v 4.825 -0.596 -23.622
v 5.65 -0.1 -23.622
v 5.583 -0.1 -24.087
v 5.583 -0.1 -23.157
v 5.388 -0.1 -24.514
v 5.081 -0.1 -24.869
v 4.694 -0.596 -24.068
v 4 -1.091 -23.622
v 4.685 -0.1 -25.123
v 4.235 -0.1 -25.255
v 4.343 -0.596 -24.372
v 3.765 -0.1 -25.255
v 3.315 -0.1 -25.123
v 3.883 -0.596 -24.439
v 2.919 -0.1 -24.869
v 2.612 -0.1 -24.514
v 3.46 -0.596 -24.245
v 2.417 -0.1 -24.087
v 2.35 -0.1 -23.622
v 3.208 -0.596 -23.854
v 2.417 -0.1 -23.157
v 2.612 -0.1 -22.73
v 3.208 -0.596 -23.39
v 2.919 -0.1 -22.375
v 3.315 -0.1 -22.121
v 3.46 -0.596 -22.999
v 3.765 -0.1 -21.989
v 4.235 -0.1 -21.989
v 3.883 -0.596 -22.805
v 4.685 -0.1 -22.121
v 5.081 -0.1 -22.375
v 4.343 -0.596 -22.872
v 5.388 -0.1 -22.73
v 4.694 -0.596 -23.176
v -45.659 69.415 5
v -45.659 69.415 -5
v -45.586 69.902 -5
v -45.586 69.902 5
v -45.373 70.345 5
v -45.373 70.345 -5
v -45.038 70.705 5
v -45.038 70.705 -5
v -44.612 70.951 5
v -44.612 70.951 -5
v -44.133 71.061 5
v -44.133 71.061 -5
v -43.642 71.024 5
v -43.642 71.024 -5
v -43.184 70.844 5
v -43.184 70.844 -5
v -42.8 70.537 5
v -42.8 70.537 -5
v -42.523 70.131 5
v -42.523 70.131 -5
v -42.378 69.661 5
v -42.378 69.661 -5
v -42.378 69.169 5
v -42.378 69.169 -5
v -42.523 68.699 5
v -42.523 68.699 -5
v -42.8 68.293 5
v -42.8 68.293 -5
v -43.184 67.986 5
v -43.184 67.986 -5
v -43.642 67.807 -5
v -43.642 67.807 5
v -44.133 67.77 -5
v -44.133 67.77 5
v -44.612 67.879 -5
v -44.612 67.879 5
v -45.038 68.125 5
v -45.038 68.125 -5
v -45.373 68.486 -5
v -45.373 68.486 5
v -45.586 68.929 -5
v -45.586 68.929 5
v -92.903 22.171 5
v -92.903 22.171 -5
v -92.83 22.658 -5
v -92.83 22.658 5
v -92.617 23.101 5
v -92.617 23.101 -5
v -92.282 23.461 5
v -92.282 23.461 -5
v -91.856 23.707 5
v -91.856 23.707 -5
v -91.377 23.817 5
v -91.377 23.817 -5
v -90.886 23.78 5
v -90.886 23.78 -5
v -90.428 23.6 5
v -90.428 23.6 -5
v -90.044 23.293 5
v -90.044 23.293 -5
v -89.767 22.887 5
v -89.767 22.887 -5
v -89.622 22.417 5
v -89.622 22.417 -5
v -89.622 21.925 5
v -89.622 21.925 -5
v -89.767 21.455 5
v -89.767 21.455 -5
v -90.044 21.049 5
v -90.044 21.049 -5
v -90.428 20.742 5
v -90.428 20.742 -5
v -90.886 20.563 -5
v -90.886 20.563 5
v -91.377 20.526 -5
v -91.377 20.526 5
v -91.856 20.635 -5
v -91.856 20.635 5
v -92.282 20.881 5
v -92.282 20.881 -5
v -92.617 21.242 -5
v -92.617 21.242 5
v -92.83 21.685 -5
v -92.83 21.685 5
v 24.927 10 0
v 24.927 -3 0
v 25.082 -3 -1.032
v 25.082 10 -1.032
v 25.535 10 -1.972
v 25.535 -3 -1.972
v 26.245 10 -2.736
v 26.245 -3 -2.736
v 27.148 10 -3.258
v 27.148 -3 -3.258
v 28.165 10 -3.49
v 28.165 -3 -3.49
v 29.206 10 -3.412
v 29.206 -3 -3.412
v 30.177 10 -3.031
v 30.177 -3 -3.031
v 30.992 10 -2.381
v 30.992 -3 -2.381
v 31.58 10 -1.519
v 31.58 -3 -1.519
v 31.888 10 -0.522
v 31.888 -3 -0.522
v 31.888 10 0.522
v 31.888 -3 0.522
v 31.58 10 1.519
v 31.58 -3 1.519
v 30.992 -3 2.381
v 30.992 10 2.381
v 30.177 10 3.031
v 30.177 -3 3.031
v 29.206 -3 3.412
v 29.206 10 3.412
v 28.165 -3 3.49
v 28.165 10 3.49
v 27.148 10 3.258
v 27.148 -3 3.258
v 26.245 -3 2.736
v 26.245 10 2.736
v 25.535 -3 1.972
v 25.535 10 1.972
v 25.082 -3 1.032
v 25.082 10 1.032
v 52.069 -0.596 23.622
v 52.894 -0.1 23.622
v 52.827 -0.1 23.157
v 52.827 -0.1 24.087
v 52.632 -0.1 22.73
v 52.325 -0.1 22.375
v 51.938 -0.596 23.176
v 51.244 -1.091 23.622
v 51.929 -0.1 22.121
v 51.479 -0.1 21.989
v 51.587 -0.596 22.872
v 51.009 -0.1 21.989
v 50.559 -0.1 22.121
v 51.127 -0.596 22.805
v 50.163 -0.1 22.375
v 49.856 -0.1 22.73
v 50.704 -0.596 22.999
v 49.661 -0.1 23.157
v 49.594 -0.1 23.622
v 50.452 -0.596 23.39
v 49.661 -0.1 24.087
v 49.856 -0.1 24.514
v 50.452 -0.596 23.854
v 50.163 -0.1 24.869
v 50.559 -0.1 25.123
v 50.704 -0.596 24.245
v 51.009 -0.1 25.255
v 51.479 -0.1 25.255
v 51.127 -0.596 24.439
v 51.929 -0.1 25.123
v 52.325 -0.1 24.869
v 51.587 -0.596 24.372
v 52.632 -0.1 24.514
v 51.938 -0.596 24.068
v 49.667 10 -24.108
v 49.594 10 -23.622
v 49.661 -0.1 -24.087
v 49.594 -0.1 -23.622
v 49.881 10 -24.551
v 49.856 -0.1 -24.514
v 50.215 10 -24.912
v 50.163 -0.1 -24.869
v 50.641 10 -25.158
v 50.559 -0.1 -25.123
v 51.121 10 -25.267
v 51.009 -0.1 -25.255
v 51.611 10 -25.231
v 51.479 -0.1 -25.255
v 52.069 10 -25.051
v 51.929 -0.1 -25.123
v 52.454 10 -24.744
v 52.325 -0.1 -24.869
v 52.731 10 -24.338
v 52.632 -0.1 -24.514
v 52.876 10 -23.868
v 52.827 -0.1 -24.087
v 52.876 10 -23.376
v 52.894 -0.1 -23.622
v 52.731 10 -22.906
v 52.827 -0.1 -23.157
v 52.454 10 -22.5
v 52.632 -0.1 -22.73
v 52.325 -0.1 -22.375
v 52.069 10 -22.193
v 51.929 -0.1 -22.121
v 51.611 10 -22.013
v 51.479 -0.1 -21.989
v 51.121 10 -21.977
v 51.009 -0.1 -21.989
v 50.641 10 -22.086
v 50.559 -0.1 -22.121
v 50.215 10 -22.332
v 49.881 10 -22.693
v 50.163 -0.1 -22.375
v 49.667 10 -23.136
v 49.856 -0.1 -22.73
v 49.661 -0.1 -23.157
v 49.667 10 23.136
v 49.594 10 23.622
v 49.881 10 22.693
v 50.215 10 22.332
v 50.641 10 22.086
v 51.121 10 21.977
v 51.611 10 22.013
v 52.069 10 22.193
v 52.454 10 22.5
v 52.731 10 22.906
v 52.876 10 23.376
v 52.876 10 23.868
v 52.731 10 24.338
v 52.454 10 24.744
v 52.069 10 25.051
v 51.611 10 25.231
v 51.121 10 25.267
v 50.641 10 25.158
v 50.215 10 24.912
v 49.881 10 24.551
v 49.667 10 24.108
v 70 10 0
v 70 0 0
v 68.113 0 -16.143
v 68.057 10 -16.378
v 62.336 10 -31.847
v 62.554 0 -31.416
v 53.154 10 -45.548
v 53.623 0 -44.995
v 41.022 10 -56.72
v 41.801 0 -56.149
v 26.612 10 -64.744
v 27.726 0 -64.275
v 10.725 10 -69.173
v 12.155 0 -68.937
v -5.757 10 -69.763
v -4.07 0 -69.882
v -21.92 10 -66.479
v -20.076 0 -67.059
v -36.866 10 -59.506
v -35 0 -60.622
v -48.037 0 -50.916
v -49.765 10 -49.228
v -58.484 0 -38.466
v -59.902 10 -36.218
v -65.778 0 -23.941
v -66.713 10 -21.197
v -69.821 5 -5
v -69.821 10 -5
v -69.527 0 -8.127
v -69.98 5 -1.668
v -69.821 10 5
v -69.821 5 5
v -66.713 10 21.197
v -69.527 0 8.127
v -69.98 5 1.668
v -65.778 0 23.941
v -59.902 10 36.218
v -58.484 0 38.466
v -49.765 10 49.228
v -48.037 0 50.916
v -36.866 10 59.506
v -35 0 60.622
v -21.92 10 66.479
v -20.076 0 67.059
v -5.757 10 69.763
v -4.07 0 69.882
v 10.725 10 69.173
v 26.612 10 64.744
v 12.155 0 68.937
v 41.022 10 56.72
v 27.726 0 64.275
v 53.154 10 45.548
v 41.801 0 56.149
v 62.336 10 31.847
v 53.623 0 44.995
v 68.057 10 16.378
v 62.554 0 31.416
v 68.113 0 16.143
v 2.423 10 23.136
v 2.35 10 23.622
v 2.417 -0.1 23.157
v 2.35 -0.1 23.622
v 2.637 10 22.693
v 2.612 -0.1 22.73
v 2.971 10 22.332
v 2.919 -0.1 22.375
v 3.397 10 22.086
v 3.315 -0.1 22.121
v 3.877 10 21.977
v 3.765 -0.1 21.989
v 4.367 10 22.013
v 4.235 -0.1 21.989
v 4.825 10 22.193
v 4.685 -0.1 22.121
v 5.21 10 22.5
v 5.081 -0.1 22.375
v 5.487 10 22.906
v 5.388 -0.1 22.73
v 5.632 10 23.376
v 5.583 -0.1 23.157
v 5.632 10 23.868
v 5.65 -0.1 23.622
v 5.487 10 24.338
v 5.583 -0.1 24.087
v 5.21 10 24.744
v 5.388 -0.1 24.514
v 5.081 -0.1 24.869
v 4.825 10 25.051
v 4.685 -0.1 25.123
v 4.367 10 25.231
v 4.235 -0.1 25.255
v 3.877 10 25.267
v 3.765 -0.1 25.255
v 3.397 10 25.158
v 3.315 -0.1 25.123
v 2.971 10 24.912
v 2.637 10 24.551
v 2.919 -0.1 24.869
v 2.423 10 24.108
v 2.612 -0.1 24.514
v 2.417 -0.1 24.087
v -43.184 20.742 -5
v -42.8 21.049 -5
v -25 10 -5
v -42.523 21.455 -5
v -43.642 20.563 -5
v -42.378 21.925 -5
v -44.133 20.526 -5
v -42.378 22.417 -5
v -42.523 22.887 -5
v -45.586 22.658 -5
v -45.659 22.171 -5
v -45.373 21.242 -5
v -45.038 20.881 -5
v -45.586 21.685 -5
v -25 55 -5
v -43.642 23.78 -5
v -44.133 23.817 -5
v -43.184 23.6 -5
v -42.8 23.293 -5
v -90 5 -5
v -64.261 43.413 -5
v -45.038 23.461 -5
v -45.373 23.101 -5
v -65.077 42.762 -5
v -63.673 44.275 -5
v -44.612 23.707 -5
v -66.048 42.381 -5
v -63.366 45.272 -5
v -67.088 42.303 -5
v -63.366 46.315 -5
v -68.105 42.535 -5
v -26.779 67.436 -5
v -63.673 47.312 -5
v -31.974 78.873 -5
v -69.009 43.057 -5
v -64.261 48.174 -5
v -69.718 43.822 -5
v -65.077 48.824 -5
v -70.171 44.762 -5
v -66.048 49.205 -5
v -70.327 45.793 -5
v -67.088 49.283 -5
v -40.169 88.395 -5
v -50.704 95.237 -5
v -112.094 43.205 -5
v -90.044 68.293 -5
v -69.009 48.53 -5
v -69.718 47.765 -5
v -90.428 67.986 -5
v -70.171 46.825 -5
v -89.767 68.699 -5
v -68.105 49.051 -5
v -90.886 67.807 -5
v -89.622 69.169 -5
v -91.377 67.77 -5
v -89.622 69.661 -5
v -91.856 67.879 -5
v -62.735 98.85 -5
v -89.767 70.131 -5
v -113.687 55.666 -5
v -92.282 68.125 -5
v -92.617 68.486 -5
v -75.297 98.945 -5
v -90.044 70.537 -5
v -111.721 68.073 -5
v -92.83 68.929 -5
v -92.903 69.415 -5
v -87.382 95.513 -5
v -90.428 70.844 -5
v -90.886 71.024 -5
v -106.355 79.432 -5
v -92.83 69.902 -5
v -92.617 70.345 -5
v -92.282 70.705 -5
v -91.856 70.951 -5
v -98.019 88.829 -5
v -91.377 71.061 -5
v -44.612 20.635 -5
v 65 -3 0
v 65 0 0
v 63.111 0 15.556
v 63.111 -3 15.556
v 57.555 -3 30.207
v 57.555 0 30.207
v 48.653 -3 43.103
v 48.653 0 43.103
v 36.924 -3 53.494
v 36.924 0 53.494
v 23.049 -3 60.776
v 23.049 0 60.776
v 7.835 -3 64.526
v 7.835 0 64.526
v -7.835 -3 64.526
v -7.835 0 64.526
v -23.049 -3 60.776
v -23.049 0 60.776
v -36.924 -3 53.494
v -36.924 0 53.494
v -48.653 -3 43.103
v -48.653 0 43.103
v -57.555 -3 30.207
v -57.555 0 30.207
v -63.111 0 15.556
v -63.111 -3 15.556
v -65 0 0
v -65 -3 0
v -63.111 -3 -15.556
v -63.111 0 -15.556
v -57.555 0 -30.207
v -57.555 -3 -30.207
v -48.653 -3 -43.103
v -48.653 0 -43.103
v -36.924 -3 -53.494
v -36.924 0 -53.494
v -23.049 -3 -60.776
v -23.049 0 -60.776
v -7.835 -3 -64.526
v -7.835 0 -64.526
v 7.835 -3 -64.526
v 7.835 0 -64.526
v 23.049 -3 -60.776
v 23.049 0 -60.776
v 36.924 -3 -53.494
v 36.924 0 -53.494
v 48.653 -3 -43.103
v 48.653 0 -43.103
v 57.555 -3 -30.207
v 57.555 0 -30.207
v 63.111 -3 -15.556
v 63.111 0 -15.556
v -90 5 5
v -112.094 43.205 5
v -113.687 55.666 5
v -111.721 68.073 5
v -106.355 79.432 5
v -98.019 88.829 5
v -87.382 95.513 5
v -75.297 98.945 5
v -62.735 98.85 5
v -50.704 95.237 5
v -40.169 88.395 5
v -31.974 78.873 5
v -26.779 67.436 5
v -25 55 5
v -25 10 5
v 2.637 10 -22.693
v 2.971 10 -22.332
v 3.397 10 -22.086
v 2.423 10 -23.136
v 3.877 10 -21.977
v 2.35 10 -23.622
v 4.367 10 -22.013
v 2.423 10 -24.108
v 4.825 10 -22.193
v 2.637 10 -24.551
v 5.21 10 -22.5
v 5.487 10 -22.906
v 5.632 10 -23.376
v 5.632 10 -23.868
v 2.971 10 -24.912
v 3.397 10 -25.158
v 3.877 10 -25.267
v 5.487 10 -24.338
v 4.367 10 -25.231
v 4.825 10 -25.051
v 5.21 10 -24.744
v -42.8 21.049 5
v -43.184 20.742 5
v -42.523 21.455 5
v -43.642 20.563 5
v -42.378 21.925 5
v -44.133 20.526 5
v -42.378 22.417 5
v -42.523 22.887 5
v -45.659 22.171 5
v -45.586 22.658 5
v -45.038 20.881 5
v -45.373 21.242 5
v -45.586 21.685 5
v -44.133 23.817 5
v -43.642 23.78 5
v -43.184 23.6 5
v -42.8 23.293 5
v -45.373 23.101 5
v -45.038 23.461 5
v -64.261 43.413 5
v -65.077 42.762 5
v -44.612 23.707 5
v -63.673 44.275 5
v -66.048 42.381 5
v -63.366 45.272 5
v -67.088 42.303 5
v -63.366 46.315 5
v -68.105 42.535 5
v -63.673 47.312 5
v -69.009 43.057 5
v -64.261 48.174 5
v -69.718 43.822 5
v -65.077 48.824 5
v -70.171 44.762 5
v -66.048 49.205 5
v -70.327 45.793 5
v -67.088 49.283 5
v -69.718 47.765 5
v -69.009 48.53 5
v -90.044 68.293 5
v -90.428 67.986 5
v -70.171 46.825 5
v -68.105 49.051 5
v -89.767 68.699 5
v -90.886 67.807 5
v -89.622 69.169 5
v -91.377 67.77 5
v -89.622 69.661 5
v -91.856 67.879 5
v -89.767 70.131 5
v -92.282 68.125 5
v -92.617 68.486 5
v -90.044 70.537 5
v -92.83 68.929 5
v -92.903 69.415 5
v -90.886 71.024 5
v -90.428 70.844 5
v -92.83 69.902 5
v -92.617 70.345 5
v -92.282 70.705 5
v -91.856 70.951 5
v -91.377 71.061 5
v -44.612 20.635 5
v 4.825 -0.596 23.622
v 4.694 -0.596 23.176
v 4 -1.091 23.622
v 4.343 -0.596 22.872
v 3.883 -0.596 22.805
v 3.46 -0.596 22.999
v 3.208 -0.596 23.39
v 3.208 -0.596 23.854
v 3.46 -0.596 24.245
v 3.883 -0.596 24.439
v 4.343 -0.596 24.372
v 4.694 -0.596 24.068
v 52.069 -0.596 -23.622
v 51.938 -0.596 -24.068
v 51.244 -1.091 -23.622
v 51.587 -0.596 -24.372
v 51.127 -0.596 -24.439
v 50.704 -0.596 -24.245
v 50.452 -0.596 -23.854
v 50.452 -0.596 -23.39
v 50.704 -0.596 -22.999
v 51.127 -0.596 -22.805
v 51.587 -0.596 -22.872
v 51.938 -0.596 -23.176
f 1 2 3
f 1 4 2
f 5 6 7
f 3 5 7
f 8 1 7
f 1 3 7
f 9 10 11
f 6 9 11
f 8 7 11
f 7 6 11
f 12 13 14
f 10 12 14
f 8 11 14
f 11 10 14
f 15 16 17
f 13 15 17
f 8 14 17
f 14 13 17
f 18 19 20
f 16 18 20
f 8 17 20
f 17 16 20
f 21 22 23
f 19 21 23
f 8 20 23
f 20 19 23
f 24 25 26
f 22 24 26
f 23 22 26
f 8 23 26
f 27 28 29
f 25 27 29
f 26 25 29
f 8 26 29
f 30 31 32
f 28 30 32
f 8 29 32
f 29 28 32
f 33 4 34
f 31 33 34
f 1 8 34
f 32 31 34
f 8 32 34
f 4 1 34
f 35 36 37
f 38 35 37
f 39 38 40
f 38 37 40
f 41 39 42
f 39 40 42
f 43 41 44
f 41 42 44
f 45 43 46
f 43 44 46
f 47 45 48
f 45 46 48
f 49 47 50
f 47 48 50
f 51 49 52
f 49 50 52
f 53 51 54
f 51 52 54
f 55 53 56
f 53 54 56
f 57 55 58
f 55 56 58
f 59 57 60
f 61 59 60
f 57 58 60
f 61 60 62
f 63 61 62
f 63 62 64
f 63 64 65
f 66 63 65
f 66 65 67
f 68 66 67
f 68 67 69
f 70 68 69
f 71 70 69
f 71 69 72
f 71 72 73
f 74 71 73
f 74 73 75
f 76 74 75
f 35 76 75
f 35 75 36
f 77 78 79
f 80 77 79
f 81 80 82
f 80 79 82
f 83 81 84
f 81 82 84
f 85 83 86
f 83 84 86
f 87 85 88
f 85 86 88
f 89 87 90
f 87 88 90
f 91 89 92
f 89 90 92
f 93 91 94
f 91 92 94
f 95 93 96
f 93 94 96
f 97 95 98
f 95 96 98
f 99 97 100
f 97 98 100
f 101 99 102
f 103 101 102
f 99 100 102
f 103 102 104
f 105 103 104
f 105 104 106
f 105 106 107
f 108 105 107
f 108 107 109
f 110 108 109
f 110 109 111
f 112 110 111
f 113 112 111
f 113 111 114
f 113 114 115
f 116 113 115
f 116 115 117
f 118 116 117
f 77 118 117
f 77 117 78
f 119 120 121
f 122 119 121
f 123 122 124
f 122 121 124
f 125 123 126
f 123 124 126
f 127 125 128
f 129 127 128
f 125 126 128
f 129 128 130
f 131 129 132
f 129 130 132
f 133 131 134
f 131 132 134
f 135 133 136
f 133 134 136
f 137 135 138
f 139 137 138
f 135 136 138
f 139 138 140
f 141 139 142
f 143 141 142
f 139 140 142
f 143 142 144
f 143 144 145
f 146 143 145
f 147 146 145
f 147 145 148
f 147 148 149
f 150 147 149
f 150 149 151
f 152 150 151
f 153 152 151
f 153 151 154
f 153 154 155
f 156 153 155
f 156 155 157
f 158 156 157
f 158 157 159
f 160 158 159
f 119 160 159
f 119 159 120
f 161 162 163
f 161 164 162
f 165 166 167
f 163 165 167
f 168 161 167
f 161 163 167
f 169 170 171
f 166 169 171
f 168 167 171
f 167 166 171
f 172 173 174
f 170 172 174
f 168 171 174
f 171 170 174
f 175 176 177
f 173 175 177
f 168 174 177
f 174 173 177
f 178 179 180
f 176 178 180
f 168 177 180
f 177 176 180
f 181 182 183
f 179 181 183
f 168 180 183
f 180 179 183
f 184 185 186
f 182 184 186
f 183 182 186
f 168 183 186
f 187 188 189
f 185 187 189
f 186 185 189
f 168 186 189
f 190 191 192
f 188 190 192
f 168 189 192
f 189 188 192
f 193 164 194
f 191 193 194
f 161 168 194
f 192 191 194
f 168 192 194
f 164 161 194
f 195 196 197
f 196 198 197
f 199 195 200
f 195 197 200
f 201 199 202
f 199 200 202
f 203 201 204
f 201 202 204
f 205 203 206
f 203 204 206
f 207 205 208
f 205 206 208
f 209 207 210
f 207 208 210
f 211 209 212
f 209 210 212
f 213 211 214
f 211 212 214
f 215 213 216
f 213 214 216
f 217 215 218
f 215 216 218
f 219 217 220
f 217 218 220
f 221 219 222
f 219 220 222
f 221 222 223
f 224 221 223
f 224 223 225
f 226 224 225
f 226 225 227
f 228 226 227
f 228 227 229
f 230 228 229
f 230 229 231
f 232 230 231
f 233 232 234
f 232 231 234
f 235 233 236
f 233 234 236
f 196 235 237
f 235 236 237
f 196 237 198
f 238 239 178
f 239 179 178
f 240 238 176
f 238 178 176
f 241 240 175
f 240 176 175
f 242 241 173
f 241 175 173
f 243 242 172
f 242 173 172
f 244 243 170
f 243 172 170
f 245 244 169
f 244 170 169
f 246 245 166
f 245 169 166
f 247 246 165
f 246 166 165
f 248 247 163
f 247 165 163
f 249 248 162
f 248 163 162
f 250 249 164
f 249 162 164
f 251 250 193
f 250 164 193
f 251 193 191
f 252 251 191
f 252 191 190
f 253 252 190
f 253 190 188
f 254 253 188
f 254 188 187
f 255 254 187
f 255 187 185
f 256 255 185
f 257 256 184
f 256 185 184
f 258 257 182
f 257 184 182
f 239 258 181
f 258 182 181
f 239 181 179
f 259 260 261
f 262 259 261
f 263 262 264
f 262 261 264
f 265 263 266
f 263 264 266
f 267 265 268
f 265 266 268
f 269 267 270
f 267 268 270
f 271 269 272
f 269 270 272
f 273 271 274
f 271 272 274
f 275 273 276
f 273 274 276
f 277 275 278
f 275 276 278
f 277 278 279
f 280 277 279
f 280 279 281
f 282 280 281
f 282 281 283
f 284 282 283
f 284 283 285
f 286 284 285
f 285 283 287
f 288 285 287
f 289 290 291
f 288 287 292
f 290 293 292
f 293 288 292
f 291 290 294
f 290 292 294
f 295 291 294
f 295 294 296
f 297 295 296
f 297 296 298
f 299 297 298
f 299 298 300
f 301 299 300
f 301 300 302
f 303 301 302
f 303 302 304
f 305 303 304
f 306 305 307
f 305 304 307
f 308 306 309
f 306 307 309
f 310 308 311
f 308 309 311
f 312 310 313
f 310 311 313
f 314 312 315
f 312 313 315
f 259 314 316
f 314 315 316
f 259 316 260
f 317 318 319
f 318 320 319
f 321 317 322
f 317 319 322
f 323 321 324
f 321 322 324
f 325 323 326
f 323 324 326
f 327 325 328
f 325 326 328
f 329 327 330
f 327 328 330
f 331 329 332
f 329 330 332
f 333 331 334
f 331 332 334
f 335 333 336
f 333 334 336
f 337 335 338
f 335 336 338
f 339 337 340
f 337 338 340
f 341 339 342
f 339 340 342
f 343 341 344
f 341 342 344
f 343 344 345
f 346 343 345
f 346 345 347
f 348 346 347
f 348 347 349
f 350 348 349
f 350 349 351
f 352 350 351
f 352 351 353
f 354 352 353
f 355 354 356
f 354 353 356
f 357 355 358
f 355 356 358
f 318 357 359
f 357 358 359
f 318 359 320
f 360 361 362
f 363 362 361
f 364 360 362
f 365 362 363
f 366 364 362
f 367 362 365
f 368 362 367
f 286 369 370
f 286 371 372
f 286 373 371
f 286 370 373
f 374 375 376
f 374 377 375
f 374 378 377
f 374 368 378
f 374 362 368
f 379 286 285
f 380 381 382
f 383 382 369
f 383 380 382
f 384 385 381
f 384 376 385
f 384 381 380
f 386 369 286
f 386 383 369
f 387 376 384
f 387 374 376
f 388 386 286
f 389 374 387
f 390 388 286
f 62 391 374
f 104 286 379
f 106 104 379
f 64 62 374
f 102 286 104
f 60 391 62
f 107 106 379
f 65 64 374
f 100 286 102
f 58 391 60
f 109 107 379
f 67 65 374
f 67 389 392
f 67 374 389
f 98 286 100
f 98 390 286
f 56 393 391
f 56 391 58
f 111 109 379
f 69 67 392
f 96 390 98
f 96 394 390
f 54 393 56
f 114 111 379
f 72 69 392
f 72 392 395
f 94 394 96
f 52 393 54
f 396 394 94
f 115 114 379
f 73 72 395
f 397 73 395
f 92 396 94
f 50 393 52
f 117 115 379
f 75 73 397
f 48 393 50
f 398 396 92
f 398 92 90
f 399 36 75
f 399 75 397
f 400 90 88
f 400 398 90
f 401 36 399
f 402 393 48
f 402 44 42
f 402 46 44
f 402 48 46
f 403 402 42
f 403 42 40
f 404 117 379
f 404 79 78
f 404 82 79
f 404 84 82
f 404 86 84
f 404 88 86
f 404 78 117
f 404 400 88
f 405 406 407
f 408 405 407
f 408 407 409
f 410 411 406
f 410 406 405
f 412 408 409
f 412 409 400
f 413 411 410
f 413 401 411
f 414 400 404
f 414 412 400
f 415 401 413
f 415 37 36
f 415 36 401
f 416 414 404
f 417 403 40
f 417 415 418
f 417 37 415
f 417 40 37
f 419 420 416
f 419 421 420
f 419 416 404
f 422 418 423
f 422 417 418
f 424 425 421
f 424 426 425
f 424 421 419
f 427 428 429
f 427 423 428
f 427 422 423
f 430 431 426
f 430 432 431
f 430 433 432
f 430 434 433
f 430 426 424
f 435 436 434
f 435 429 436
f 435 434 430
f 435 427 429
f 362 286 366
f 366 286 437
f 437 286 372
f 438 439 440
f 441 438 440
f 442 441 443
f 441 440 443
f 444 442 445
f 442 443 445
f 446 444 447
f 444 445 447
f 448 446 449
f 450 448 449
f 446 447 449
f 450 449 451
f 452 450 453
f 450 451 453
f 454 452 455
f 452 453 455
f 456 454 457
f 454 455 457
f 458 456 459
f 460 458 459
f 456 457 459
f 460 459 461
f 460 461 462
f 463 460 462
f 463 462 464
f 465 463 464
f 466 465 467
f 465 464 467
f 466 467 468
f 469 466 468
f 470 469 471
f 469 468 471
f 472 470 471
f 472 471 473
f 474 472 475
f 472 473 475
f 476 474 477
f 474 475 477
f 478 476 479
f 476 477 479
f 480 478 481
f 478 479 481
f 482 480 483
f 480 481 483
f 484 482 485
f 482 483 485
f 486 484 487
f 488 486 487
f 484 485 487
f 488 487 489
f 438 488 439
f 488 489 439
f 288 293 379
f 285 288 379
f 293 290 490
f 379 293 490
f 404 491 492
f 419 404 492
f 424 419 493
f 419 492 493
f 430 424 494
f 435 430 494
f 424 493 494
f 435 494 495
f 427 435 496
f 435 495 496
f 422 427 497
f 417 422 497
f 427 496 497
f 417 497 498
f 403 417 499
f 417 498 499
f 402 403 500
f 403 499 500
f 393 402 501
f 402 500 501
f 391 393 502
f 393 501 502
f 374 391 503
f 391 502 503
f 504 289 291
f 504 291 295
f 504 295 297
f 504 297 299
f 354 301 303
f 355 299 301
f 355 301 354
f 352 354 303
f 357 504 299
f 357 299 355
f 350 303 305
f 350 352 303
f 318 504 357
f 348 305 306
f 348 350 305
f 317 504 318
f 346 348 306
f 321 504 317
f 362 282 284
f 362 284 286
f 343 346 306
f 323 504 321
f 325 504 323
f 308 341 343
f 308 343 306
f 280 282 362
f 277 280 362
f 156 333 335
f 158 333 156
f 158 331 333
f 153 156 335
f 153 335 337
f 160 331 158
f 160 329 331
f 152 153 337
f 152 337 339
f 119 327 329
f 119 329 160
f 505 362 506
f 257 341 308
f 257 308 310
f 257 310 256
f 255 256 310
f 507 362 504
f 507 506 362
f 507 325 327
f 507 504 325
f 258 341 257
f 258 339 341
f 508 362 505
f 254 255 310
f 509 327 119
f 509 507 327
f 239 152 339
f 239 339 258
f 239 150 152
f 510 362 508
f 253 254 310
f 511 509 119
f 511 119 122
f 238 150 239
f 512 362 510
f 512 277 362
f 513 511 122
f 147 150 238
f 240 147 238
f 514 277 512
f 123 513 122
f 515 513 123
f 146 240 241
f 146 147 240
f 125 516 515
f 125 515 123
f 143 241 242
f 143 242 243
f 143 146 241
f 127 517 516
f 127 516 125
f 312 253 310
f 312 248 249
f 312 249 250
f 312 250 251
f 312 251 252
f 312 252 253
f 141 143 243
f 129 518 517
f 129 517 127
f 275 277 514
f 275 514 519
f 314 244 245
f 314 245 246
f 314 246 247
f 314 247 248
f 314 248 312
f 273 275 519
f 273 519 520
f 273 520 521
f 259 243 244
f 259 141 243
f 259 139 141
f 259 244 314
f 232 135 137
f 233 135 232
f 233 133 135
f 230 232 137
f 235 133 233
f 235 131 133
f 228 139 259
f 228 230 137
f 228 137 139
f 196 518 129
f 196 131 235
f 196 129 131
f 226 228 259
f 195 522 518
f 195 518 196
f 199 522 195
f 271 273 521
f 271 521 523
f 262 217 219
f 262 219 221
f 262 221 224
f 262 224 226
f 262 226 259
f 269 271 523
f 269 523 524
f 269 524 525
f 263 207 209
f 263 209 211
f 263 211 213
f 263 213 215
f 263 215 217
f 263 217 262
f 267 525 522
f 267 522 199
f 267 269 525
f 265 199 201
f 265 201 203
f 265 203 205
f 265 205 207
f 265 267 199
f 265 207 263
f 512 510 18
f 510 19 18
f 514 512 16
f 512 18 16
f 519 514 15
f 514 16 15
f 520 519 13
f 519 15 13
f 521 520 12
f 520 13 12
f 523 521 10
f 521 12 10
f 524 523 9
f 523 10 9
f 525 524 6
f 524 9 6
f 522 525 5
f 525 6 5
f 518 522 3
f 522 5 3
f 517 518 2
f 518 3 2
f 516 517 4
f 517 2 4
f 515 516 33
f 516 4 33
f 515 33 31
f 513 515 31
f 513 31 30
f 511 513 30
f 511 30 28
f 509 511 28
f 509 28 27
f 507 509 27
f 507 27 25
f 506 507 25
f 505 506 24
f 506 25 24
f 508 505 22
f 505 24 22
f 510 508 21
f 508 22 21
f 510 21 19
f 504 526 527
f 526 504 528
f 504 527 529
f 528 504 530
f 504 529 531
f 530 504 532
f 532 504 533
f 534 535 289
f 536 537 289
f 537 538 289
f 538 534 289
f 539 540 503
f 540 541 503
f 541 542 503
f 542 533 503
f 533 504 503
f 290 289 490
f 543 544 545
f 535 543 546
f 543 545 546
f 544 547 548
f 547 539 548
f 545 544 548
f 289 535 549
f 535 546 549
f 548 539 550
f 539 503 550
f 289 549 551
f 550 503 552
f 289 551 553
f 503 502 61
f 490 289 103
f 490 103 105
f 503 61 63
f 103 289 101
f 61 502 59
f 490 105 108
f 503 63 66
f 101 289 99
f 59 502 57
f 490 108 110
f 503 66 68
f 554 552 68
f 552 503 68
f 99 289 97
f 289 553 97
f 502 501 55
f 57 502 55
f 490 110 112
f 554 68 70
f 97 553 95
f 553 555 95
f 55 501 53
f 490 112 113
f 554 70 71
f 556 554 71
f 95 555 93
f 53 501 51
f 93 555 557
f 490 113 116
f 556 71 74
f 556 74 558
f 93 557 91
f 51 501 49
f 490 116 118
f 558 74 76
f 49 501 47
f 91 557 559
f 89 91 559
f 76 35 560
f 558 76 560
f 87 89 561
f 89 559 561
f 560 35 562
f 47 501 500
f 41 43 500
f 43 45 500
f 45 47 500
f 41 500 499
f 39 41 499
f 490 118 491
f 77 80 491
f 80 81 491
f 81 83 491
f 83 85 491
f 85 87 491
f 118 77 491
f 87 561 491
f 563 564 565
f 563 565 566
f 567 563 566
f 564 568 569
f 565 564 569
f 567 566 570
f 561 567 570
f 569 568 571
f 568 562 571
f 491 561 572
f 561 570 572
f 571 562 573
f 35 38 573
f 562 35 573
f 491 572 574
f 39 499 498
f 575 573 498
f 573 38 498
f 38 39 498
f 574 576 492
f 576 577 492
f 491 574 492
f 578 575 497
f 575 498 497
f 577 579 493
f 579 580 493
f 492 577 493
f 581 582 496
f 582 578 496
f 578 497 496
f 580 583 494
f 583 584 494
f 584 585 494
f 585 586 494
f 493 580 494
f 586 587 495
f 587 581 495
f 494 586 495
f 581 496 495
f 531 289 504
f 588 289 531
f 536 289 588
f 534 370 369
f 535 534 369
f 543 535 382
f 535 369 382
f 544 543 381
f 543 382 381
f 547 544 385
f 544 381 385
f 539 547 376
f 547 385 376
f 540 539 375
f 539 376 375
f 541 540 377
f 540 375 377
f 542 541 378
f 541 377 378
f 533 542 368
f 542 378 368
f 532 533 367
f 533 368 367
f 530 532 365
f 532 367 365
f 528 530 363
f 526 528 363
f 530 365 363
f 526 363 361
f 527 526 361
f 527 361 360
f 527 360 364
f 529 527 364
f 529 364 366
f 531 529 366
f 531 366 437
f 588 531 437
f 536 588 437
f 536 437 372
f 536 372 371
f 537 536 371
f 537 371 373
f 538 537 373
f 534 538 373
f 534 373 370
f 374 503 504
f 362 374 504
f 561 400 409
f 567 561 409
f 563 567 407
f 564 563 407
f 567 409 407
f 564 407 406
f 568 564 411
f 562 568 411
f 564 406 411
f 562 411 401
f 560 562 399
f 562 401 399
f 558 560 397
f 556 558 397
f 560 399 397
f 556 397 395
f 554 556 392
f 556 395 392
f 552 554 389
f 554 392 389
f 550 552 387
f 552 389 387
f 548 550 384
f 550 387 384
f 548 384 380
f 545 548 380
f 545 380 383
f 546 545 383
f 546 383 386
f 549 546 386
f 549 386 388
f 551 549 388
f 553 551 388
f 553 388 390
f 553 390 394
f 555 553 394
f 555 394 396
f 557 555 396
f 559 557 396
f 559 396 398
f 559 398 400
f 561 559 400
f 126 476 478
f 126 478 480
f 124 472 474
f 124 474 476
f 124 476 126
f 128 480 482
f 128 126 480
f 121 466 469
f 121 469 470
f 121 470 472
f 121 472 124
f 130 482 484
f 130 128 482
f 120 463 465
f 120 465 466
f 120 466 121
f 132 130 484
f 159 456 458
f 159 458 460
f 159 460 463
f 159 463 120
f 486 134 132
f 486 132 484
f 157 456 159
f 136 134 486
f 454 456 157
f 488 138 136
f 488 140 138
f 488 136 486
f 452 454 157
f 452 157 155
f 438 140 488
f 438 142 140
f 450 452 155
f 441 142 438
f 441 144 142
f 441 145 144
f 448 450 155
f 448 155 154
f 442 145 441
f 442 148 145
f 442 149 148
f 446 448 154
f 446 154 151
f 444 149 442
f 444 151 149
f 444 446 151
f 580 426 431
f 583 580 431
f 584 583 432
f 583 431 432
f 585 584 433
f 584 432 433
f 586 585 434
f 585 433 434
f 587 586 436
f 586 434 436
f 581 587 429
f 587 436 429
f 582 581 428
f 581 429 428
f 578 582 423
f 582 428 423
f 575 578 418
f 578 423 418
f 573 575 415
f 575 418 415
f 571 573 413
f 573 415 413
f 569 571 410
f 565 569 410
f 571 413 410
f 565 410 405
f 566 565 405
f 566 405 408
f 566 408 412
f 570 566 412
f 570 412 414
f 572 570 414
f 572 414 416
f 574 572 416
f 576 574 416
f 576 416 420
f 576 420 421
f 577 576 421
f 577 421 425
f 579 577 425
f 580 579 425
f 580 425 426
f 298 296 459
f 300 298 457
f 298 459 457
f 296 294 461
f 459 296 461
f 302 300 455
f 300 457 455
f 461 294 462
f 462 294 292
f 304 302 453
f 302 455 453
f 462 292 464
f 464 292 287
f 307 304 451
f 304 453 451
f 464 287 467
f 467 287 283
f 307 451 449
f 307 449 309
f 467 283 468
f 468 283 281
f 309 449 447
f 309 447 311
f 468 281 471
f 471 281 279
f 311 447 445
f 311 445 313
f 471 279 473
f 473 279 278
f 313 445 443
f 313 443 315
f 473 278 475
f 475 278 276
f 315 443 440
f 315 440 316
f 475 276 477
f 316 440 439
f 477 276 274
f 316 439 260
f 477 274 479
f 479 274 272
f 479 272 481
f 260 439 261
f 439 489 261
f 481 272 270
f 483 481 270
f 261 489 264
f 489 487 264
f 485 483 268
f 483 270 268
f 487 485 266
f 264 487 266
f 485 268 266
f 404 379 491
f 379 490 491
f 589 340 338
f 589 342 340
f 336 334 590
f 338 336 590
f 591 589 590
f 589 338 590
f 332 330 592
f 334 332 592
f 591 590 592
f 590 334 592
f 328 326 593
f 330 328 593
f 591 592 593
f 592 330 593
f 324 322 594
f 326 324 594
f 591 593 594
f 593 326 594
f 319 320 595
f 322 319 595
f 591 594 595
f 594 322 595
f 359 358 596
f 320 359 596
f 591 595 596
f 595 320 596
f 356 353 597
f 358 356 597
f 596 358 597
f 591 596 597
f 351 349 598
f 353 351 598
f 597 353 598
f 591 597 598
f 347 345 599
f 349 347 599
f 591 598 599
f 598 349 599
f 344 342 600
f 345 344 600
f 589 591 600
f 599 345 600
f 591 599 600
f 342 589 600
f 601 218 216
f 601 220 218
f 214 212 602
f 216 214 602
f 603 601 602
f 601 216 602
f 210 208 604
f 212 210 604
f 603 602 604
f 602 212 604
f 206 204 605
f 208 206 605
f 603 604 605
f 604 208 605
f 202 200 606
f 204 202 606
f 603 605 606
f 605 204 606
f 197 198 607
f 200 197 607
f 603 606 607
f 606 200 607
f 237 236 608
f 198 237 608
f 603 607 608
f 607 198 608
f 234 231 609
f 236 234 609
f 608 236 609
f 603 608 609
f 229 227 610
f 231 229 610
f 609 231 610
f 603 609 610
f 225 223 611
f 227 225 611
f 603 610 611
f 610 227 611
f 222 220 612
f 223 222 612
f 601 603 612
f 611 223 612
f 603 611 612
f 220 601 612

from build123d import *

# Parameters (mm, degrees)
SKETCH1_R                 = 70
BOSS_EXTRUDE1_DEPTH       = 10
SKETCH2_R                 = 65
BOSS_EXTRUDE2_DEPTH       = 3
BOSS_EXTRUDE3_DEPTH       = 5
M4X0_7_TAPPED_HOLE1_D     = 3.3
M4X0_7_TAPPED_HOLE1_DEPTH = 10.1
M4X0_7_TAPPED_HOLE1_TIP   = 0.991420021
M8X1_0_TAPPED_HOLE1_D     = 7
M4X0_7_TAPPED_HOLE3_D     = 3.3
M4X0_7_TAPPED_HOLE3_DEPTH = 10.1
M4X0_7_TAPPED_HOLE3_TIP   = 0.991420021
M8X1_0_TAPPED_HOLE2_D     = 7


with BuildPart() as part:
    # Sketch1 → Boss-Extrude1 (new body)
    with BuildSketch(Plane(origin=(0, 0, 0), x_dir=(1, 0, 0), z_dir=(0, 1, 0))):
        Circle(SKETCH1_R)
    extrude(amount=BOSS_EXTRUDE1_DEPTH)

    # Sketch2 → Boss-Extrude2 (add)
    with BuildSketch(Plane.XZ):
        Circle(SKETCH2_R)
    extrude(amount=BOSS_EXTRUDE2_DEPTH)

    # Sketch3 → Boss-Extrude3 (add, symmetric)
    with BuildSketch(Plane.XY):
        with BuildLine():
            Line((-25, 55), (-25, 5))
            Line((-25, 5), (-90, 5))
            Line((-90, 5), (-112.094257771, 43.204763027))
            ThreePointArc((-112.094257771, 43.204763027), (-75.29730578, 98.944673602), (-25, 55))
        make_face()
    extrude(amount=BOSS_EXTRUDE3_DEPTH, both=True)

    # M4x0.7 Tapped Hole1
    with Locations(Plane(origin=(0, 10, 0), x_dir=(1, 0, 0), z_dir=(0, 1, 0))):
        with Locations((4, 23.622), (51.244, 23.622), (51.244, -23.622), (4, -23.622)):
            Hole(M4X0_7_TAPPED_HOLE1_D / 2, depth=M4X0_7_TAPPED_HOLE1_DEPTH)
            with Locations((0, 0, -(M4X0_7_TAPPED_HOLE1_DEPTH + M4X0_7_TAPPED_HOLE1_TIP / 2))):  # 118° drill point
                Cone(0, M4X0_7_TAPPED_HOLE1_D / 2, M4X0_7_TAPPED_HOLE1_TIP, mode=Mode.SUBTRACT)

    # M8x1.0 Tapped Hole1 (through all)
    with Locations(Plane(origin=(0, 10, 0), x_dir=(1, 0, 0), z_dir=(0, 1, 0))):
        with Locations((28.426798857, 0)):
            Hole(M8X1_0_TAPPED_HOLE1_D / 2)

    # M4x0.7 Tapped Hole3
    with Locations(Plane(origin=(-95.25342131, 45.793176502, 5), x_dir=(1, 0, 0), z_dir=(0, 0, 1))):
        with Locations((4, 23.622), (51.244, 23.622), (51.244, -23.622), (4, -23.622)):
            Hole(M4X0_7_TAPPED_HOLE3_D / 2, depth=M4X0_7_TAPPED_HOLE3_DEPTH)
            with Locations((0, 0, -(M4X0_7_TAPPED_HOLE3_DEPTH + M4X0_7_TAPPED_HOLE3_TIP / 2))):  # 118° drill point
                Cone(0, M4X0_7_TAPPED_HOLE3_D / 2, M4X0_7_TAPPED_HOLE3_TIP, mode=Mode.SUBTRACT)

    # M8x1.0 Tapped Hole2 (through all)
    with Locations(Plane(origin=(-95.25342131, 45.793176502, 5), x_dir=(1, 0, 0), z_dir=(0, 0, 1))):
        with Locations((28.426798857, 0)):
            Hole(M8X1_0_TAPPED_HOLE2_D / 2)


solid = part.part
